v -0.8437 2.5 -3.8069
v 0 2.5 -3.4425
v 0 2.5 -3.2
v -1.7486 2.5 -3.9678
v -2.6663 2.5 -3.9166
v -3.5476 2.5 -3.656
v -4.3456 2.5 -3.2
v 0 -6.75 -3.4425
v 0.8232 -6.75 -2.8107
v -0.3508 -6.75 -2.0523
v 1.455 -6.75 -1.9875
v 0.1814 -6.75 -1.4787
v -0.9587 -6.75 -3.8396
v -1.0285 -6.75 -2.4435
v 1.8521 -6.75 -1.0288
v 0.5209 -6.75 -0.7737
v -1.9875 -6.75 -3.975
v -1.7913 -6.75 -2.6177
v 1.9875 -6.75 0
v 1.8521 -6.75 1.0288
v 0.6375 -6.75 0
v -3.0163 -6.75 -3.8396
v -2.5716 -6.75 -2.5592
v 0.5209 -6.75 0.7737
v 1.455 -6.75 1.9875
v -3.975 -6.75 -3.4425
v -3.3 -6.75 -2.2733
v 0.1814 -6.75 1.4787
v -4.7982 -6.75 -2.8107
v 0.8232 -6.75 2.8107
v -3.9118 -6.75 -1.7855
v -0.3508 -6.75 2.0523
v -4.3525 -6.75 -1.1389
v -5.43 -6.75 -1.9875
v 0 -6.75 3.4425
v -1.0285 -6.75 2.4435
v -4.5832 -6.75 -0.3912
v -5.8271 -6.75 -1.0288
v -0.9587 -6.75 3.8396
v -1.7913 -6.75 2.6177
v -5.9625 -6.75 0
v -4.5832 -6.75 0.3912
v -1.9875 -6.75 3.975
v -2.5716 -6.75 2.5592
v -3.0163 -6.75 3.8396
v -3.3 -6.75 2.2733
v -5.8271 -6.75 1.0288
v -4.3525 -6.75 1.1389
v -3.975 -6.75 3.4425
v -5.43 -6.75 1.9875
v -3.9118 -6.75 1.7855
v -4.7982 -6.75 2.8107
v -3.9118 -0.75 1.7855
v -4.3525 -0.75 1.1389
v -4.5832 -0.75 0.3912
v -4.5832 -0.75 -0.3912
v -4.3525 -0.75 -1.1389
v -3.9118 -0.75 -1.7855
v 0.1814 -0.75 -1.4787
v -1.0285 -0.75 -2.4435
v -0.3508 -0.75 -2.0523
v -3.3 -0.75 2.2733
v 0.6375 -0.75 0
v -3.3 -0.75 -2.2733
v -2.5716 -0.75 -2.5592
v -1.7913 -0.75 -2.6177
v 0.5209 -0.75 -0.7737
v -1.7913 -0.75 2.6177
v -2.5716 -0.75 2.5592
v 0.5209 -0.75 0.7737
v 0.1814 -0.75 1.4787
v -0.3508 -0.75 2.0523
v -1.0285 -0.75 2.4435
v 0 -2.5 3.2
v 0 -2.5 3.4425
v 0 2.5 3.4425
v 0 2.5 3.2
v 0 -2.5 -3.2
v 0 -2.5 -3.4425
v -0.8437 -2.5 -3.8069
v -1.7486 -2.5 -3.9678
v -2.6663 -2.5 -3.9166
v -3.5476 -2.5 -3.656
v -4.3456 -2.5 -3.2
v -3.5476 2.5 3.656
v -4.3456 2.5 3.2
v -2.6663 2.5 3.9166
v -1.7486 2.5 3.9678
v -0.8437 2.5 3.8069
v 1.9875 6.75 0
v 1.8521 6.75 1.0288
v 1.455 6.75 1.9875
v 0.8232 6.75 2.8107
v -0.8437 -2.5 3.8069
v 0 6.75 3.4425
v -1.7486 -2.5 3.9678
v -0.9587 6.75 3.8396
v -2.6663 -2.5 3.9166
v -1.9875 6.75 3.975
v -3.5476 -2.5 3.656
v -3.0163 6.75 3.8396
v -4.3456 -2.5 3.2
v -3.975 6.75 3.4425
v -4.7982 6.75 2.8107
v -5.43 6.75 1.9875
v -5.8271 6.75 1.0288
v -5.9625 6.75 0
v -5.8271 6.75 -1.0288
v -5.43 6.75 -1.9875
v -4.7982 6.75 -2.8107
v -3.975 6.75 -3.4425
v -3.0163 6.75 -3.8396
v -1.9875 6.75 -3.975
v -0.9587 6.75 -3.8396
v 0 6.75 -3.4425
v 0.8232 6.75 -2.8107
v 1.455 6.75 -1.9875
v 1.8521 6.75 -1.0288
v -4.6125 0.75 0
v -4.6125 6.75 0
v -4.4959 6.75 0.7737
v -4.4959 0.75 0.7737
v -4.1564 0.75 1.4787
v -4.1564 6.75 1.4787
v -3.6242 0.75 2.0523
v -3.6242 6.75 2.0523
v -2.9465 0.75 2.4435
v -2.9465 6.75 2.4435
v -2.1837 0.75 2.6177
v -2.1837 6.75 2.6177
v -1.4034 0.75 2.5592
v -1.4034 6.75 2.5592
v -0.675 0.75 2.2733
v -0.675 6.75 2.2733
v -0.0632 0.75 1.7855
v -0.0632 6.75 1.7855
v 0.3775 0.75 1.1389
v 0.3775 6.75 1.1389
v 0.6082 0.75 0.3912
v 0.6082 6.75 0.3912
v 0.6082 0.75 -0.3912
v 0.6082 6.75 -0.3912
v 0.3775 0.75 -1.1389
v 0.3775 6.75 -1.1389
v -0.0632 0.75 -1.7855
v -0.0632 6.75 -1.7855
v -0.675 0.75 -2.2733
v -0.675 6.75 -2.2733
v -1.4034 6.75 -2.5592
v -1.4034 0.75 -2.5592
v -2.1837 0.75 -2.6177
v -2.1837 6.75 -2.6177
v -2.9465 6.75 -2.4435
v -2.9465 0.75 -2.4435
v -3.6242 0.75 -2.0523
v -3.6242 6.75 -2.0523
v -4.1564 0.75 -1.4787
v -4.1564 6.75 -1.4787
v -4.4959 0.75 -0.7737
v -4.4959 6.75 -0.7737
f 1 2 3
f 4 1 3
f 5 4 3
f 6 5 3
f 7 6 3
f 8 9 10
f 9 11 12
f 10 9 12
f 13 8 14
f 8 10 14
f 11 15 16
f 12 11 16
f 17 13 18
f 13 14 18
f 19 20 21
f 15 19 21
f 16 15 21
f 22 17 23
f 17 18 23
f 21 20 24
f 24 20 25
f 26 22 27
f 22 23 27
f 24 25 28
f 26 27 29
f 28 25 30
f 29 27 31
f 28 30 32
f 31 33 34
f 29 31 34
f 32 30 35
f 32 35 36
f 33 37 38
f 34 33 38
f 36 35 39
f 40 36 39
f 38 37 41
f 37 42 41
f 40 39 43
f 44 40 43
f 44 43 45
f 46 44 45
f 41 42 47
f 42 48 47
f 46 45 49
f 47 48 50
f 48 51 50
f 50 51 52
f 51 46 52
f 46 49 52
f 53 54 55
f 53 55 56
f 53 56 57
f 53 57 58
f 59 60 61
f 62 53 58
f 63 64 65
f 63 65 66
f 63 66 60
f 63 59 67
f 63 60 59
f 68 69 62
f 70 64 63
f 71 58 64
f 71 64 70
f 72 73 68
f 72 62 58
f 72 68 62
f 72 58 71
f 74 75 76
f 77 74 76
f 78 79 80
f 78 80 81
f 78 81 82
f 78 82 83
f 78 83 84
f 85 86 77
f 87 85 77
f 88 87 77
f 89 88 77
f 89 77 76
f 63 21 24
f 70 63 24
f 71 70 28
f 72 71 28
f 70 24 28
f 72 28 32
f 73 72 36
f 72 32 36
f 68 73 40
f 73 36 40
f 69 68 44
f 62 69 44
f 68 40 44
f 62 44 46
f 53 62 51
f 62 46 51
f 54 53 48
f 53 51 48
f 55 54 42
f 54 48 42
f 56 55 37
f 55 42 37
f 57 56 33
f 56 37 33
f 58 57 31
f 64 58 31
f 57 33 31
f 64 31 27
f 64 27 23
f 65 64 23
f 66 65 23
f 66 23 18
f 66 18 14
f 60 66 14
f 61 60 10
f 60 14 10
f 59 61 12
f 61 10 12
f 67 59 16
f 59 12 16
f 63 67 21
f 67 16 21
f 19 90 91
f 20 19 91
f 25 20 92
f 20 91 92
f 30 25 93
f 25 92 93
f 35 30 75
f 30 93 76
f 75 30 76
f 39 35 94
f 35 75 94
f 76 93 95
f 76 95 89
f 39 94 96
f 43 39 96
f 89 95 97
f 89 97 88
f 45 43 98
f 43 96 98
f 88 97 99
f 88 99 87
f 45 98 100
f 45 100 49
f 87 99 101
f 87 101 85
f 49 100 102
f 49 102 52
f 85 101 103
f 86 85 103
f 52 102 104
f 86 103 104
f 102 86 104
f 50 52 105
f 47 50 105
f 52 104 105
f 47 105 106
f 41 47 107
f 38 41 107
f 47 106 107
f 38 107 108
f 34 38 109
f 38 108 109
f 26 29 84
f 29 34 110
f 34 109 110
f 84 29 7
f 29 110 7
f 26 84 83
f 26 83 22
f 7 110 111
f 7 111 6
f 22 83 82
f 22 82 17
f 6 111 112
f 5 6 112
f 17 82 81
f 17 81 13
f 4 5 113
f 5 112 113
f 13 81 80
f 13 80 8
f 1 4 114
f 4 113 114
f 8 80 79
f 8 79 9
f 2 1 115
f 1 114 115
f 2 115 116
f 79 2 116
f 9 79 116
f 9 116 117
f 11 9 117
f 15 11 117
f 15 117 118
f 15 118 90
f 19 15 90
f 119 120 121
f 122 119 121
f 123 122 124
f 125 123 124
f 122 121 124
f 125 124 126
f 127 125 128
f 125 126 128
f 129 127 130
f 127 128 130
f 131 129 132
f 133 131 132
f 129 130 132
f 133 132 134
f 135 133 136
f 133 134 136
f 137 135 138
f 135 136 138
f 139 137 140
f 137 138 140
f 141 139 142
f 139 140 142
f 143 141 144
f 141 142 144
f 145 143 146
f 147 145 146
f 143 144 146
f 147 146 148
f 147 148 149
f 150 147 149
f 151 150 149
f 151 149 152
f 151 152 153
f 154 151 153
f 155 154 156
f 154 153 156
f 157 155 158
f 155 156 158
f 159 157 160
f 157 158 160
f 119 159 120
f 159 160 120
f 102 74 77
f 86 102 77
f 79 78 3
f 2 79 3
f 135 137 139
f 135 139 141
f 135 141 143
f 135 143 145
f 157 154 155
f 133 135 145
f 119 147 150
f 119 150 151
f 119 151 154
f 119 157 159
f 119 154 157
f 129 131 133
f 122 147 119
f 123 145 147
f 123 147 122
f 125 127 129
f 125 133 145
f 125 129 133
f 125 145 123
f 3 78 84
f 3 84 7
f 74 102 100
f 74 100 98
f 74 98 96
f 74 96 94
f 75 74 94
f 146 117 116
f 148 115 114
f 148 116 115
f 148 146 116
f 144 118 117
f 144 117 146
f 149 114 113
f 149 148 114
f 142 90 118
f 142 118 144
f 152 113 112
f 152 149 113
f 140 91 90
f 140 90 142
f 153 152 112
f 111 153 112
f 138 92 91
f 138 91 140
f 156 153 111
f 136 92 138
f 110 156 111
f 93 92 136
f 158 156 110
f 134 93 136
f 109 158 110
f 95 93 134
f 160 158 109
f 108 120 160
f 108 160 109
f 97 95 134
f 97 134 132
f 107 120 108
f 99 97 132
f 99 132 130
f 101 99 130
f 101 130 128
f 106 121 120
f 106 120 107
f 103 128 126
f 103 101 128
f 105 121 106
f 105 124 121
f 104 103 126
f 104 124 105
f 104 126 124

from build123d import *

# Parameters (mm, degrees)
F0_W     = 3.975
F0_H     = 13.5
F2_W     = 5
F2_H     = 10
F2_H_2   = 1.897511
F3_DEPTH = 25
F4_R     = 2.625
F5_DEPTH = 6
F6_R     = 2.625
F7_DEPTH = 6


with BuildPart() as f1:
    # F0 (on Top) → F1 (revolve)
    with BuildSketch(Plane.XY):
        Rectangle(F0_W, F0_H)
    revolve(axis=Axis((-1.9875, 0, 0), (0, -1, 0)))

    # F2 (on Right) → F3 (cut)
    with BuildSketch(Plane.YZ):
        with Locations((0, -8.2)):
            Rectangle(F2_W, F2_H)
        with Locations((0, 4.148756)):
            Rectangle(F2_W, F2_H_2)
    extrude(amount=-F3_DEPTH, mode=Mode.SUBTRACT)

    # F4 (on face) → F5 (cut)
    with BuildSketch(Plane.XZ.offset(6.75)):
        with Locations((-1.9875, 0)):
            Circle(F4_R)
    extrude(amount=-F5_DEPTH, mode=Mode.SUBTRACT)

    # F6 (on face) → F7 (cut)
    with BuildSketch(Plane(origin=(0, 6.75, 0), x_dir=(-1, 0, 0), z_dir=(0, 1, 0))):
        with Locations((1.9875, 0)):
            Circle(F6_R)
    extrude(amount=-F7_DEPTH, mode=Mode.SUBTRACT)


solid = f1.part
